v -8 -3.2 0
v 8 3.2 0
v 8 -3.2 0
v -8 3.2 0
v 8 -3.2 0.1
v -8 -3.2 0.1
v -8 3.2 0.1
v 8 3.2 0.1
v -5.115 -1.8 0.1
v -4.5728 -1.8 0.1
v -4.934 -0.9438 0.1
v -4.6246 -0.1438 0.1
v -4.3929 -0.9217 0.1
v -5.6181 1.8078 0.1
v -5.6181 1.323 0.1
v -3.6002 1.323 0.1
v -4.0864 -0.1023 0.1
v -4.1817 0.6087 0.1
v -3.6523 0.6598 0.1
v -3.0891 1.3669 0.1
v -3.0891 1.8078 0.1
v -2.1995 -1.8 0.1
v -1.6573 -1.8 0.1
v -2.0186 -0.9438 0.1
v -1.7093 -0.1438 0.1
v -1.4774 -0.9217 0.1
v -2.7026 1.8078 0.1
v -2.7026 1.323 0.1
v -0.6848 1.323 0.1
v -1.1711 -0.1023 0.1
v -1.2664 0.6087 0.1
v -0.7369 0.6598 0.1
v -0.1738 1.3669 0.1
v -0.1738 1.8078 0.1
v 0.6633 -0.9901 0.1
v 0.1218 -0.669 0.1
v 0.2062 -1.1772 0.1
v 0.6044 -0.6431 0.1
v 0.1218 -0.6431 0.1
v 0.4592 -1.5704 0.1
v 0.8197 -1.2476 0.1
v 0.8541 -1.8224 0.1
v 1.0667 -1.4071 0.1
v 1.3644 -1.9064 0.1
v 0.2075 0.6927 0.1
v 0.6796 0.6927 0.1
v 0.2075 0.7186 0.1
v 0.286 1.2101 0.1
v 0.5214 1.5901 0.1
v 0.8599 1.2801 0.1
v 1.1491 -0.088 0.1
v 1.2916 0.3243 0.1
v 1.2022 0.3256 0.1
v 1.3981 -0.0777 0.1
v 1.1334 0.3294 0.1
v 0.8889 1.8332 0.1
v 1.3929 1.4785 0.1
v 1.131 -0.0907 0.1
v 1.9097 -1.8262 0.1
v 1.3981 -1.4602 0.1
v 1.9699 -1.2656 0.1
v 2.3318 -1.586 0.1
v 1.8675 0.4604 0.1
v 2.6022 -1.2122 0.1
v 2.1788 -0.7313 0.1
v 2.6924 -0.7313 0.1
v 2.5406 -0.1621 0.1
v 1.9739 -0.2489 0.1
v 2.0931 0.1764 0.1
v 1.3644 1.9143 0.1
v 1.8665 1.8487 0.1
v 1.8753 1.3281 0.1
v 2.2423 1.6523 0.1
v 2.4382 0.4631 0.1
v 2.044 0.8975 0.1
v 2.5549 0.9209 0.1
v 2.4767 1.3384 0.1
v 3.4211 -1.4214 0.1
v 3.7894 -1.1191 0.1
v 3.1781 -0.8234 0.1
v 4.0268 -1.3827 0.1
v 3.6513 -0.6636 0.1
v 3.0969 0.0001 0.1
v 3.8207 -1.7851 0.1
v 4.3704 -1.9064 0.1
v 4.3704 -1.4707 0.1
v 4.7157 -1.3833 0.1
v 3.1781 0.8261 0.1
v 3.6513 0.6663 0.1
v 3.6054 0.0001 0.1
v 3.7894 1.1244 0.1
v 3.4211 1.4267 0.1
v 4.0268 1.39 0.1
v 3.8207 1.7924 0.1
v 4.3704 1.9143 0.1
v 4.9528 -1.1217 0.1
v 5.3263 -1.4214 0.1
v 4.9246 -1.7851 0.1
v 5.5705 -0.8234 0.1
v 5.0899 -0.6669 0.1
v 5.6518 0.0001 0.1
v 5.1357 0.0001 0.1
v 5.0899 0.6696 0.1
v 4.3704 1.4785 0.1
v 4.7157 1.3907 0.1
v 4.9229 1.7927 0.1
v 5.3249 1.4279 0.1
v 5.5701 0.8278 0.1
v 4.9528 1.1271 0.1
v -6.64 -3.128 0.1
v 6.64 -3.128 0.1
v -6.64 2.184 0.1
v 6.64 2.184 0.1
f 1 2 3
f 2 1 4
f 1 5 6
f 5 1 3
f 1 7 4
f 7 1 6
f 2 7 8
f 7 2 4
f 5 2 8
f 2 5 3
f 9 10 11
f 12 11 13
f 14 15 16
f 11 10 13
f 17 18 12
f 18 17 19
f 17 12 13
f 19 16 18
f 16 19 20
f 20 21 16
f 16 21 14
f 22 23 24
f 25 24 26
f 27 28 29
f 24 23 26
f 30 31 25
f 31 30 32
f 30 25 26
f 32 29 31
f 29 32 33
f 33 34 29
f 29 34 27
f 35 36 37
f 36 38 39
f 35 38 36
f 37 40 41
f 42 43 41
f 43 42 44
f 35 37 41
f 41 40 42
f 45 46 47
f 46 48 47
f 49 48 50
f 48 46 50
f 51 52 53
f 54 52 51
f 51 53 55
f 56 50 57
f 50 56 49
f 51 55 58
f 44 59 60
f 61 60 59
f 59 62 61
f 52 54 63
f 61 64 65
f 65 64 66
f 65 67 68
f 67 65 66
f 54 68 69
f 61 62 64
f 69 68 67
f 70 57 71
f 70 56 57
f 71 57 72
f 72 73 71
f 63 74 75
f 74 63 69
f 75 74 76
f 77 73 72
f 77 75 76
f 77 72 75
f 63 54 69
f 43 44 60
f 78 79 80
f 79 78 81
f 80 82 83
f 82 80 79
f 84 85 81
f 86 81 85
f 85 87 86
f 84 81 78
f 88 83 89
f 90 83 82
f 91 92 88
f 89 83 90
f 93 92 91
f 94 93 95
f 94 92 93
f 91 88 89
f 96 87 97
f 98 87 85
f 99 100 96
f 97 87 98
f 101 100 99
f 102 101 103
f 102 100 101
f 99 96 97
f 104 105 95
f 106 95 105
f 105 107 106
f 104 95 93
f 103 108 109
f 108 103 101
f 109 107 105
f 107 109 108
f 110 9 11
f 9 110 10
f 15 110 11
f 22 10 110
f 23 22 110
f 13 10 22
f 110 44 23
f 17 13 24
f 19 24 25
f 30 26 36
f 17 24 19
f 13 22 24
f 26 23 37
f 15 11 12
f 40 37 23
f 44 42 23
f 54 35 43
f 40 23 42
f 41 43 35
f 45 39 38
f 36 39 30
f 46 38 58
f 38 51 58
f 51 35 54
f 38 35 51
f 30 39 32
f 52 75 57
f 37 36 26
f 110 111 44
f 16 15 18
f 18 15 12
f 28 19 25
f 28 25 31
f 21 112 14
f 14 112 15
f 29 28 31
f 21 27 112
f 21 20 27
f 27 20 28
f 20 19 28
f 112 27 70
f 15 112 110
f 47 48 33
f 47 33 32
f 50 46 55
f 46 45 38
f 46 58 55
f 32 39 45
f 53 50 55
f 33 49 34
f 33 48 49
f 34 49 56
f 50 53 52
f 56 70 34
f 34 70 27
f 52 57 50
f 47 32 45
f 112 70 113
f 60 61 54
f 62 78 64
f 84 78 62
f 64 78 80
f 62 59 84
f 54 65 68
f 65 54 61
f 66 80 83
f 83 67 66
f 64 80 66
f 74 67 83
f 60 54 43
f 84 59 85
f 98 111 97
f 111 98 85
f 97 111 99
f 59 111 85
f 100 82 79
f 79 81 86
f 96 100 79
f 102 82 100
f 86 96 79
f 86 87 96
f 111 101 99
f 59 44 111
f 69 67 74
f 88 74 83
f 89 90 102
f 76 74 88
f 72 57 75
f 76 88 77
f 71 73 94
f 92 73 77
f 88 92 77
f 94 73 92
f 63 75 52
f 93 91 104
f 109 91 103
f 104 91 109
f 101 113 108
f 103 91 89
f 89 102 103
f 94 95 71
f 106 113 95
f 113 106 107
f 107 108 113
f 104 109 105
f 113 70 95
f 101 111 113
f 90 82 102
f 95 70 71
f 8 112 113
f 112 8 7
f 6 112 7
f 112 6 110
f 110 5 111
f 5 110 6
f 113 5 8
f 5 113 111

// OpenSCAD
use <../lib.scad>
use <../p/box5-12.scad>
use <s/191905s01.scad>
$fa=1; $fs=0.2;
function ldraw_lib__191905b(realsolid=false) = [
// 0 Sticker  0.8 x  2 with White "7730"
// 0 Name: 191905b.dat
// 0 Author: Steffen [Steffen]
// 0 !LDRAW_ORG Part UPDATE 2012-01
// 0 !LICENSE Licensed under CC BY 2.0 and CC BY 4.0 : see CAreadme.txt
// 
// 0 BFC CERTIFY CCW
  [0,"BFC","CERTIFY"],
  [0,"BFC","CCW"],
// 
// 0 !HISTORY 2012-03-30 [PTadmin] Official Update 2012-01
// 
// 
// 1 16 0 -0.25 0 20 0 0 0 0.25 0 0 0 -8 box5-12.dat
  [1,16,0,-0.25,0,20,0,0,0,0.25,0,0,0,-8, ldraw_lib__box5_12(realsolid)],
// 1 16 0 -0.25 -4.5 0.415 0 0 0 1 0 0 0 0.415 s\191905s01.dat
  [1,16,0,-0.25,-4.5,0.415,0,0,0,1,0,0,0,0.415, ldraw_lib__s__191905s01(realsolid)],
// 4 16 -20 -0.25 8 -16.6 -0.25 5.46 16.6 -0.25 5.46 20 -0.25 8
  [4,16,-20,-0.25,8,-16.6,-0.25,5.46,16.6,-0.25,5.46,20,-0.25,8],
// 4 16 -16.6 -0.25 5.46 -20 -0.25 8 -20 -0.25 -8 -16.6 -0.25 -7.82
  [4,16,-16.6,-0.25,5.46,-20,-0.25,8,-20,-0.25,-8,-16.6,-0.25,-7.82],
// 4 16 -16.6 -0.25 -7.82 -20 -0.25 -8 20 -0.25 -8 16.6 -0.25 -7.82
  [4,16,-16.6,-0.25,-7.82,-20,-0.25,-8,20,-0.25,-8,16.6,-0.25,-7.82],
// 4 16 20 -0.25 8 16.6 -0.25 5.46 16.6 -0.25 -7.82 20 -0.25 -8
  [4,16,20,-0.25,8,16.6,-0.25,5.46,16.6,-0.25,-7.82,20,-0.25,-8],
// 0
];
module ldraw_lib__191905b(step=0, col=false, unit=2/5, alt=false, line=0.2, solid=!$preview)
    makepoly(ldraw_lib__191905b(solid), step=step, col=col, unit=unit, alt=alt, line=line, solid=solid);
ldraw_lib__191905b(line=0.2);
